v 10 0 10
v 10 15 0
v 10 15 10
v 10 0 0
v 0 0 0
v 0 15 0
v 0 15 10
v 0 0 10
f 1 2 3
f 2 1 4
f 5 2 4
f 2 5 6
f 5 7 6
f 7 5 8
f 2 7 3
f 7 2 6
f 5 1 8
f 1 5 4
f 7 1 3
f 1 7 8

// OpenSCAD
base_x = 10;
base_y = 15;
base_z = 20;
hole_dia = 20;


difference(){
cube([base_x,base_y,base_z]);
translate([base_x/2, base_y/2, base_z/2])	cylinder(h = base_z*2, d = 30);
}
